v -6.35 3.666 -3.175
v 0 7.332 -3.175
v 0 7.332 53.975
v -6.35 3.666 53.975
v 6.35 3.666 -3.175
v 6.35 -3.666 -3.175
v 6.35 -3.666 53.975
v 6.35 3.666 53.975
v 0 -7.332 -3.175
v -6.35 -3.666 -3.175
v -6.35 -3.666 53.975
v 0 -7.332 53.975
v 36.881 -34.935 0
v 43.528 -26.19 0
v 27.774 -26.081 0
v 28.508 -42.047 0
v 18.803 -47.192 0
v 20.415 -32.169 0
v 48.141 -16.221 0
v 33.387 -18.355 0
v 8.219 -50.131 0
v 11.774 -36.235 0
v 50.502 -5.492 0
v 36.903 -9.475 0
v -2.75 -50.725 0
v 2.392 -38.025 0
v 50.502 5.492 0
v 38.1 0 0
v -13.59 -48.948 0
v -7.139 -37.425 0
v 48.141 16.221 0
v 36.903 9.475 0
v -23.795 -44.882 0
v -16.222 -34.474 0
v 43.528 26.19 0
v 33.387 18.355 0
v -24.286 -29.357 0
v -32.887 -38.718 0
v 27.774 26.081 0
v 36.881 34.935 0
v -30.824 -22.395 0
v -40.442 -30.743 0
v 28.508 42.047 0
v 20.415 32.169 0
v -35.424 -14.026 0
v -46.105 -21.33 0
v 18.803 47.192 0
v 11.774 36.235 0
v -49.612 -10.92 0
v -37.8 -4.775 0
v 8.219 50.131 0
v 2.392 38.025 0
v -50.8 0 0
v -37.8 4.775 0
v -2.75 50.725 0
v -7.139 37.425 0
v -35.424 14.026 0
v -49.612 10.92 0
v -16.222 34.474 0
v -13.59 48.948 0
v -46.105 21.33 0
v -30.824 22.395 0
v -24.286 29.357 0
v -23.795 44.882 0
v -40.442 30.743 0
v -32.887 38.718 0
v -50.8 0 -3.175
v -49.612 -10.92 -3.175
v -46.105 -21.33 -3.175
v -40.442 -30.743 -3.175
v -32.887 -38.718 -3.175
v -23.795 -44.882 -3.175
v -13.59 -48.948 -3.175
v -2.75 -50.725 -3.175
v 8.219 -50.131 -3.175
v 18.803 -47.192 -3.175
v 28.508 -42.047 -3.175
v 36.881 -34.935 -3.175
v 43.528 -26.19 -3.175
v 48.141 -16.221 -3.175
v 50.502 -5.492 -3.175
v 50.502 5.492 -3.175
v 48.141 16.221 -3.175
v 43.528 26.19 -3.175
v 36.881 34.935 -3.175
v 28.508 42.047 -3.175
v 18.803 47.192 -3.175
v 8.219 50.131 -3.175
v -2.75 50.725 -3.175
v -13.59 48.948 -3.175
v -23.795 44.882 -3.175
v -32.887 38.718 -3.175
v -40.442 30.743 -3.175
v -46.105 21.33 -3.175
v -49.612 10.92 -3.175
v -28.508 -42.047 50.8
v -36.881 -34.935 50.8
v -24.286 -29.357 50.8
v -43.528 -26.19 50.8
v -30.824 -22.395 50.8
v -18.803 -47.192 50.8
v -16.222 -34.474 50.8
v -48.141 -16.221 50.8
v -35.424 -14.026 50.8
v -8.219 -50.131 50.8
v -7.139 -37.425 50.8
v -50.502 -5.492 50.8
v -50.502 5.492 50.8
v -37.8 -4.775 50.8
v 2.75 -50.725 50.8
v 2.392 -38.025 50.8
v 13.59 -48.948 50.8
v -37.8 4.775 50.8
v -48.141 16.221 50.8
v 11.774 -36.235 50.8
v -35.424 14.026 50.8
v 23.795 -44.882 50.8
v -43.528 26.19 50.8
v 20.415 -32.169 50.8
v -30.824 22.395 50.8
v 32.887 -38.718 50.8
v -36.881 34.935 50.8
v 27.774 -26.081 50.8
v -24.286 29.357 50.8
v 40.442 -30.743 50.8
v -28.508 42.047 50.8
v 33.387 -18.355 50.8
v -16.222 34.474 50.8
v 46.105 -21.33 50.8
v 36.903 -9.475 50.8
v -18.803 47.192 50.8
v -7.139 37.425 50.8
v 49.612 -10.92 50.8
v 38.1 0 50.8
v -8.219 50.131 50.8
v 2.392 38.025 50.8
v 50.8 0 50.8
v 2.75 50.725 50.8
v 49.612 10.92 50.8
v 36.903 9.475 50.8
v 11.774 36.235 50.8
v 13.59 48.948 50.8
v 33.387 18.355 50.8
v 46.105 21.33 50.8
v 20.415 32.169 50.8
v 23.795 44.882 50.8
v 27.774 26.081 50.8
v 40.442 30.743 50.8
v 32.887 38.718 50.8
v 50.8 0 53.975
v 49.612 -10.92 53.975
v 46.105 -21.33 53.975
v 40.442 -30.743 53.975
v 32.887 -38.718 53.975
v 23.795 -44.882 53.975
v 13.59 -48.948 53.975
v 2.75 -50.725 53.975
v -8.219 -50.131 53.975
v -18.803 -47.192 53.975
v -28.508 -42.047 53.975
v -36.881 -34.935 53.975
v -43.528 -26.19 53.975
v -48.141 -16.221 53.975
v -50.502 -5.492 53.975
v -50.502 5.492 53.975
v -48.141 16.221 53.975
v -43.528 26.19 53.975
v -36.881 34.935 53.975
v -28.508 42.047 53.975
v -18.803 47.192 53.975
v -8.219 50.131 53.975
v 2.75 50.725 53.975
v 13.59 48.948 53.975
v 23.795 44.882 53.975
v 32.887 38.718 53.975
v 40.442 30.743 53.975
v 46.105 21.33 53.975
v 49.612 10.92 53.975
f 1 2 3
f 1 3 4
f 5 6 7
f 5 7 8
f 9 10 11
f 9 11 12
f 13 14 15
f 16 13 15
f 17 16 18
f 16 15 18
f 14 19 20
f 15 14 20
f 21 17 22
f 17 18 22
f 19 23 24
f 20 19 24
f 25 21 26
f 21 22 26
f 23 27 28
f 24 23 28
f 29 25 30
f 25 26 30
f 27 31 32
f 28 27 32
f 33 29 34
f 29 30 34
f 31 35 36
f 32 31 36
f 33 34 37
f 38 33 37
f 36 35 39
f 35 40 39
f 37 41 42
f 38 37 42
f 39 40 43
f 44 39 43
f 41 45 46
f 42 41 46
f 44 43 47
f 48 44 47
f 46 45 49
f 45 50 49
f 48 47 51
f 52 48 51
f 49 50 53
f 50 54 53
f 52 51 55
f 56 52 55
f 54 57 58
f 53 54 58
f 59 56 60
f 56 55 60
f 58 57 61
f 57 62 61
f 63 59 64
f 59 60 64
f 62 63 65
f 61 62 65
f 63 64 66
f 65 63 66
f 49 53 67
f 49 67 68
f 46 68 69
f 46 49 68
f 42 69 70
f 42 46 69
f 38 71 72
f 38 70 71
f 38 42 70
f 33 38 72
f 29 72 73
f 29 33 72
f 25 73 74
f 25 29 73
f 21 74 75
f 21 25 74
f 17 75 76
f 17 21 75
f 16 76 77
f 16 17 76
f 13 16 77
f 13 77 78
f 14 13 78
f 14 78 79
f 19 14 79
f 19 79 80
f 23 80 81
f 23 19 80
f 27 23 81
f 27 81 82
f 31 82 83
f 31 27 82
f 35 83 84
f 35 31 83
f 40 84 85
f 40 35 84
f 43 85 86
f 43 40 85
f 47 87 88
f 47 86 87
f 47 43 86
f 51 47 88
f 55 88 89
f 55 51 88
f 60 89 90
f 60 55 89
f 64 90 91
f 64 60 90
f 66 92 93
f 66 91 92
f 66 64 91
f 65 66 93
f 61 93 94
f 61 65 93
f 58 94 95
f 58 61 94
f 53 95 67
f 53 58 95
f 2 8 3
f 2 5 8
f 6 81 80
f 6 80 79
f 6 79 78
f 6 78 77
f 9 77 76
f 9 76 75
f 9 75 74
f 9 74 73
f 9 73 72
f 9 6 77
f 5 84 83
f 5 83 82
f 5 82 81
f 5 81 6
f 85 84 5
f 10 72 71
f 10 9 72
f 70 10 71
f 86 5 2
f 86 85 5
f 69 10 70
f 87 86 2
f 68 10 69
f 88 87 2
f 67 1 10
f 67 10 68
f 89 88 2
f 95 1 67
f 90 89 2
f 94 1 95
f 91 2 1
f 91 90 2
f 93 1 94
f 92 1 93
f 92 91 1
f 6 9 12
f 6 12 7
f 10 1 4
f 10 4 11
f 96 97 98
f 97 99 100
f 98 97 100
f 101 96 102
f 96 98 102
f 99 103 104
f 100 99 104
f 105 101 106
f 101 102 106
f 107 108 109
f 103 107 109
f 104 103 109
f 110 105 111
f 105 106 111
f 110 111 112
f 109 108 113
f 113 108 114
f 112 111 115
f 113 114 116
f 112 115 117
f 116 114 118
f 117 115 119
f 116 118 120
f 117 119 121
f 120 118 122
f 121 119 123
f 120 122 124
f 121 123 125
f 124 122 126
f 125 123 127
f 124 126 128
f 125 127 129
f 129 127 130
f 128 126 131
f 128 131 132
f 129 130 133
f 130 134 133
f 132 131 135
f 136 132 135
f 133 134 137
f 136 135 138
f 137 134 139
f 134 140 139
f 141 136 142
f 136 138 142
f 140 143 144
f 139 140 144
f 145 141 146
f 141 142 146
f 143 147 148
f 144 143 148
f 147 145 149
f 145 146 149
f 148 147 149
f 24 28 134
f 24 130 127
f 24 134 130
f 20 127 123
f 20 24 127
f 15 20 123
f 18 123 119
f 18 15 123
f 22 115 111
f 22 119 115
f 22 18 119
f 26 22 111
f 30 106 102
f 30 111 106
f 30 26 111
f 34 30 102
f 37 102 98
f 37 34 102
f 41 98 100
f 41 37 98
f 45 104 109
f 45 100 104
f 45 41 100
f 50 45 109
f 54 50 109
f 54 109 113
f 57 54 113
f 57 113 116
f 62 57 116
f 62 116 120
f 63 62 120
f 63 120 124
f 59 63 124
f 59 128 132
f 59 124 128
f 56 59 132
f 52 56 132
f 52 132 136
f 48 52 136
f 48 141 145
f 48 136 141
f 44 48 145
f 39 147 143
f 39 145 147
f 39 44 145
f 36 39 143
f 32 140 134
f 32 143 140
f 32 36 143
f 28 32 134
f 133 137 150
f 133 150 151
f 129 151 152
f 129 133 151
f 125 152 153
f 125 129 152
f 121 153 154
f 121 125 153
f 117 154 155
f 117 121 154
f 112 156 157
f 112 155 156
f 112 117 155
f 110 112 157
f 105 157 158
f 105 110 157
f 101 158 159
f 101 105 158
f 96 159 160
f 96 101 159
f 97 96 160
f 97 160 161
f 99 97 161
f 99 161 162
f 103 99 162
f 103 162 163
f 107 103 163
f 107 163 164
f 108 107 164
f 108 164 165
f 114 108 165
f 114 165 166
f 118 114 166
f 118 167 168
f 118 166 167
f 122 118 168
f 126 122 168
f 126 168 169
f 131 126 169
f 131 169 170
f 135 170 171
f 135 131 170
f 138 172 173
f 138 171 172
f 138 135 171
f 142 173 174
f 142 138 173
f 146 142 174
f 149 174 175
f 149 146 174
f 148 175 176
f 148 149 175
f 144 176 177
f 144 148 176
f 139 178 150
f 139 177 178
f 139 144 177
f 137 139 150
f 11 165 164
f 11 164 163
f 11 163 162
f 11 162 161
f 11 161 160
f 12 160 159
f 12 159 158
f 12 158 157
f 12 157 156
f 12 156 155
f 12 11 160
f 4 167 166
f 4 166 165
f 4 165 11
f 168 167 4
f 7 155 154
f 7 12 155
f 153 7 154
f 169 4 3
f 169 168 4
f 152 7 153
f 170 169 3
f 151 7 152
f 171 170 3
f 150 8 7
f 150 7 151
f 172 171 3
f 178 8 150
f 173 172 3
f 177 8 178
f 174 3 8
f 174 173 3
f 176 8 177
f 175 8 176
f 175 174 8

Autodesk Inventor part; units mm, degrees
ref_plane "YZ Plane" through (0, 0, 0) normal (1, 0, 0) x (0, 1, 0)
ref_plane "XZ Plane" through (0, 0, 0) normal (0, 1, 0) x (-1, 0, 0)
ref_plane "XY Plane" through (0, 0, 0) normal (0, 0, 1) x (1, 0, 0)
sketch "Sketch1" plane through (0, 0, 0) normal (0, 0, 1) x (1, 0, 0)
  circle A0 centre (0, 0) radius 38.1
  dimension "d0" = 76.2
extrude "Extrusion1" add sketch "Sketch1" along normal blind 50.8
sketch "Sketch2" plane through (0, 0, 50.8) normal (0, 0, 1) x (1, 0, 0)
  circle A0 centre (0, 0) radius 50.8
  dimension "d3" = 101.6
extrude "Extrusion2" add sketch "Sketch2" along normal blind 3.175
sketch "Sketch3" plane through (0, 0, 0) normal (0, 0, -1) x (-1, 0, 0)
  circle A0 centre (0, 0) radius 50.8
extrude "Extrusion3" add sketch "Sketch3" along normal blind 3.175
sketch "Sketch4" plane through (0, 0, -3.175) normal (0, 0, -1) x (-1, 0, 0)
  line L0 (6.35, -3.6662) -> (0, -7.3323)
  line L1 (0, -7.3323) -> (-6.35, -3.6662)
  line L2 (-6.35, -3.6662) -> (-6.35, 3.6662)
  line L3 (-6.35, 3.6662) -> (0, 7.3323)
  line L4 (0, 7.3323) -> (6.35, 3.6662)
  line L5 (6.35, 3.6662) -> (6.35, -3.6662)
  point P0 (0, 0)
  point P1 (0, 0)
  dimension "d8" = 12.7
extrude "Extrusion4" cut sketch "Sketch4" against normal through all
properties part number "Spool" material "Aluminum 6061"
